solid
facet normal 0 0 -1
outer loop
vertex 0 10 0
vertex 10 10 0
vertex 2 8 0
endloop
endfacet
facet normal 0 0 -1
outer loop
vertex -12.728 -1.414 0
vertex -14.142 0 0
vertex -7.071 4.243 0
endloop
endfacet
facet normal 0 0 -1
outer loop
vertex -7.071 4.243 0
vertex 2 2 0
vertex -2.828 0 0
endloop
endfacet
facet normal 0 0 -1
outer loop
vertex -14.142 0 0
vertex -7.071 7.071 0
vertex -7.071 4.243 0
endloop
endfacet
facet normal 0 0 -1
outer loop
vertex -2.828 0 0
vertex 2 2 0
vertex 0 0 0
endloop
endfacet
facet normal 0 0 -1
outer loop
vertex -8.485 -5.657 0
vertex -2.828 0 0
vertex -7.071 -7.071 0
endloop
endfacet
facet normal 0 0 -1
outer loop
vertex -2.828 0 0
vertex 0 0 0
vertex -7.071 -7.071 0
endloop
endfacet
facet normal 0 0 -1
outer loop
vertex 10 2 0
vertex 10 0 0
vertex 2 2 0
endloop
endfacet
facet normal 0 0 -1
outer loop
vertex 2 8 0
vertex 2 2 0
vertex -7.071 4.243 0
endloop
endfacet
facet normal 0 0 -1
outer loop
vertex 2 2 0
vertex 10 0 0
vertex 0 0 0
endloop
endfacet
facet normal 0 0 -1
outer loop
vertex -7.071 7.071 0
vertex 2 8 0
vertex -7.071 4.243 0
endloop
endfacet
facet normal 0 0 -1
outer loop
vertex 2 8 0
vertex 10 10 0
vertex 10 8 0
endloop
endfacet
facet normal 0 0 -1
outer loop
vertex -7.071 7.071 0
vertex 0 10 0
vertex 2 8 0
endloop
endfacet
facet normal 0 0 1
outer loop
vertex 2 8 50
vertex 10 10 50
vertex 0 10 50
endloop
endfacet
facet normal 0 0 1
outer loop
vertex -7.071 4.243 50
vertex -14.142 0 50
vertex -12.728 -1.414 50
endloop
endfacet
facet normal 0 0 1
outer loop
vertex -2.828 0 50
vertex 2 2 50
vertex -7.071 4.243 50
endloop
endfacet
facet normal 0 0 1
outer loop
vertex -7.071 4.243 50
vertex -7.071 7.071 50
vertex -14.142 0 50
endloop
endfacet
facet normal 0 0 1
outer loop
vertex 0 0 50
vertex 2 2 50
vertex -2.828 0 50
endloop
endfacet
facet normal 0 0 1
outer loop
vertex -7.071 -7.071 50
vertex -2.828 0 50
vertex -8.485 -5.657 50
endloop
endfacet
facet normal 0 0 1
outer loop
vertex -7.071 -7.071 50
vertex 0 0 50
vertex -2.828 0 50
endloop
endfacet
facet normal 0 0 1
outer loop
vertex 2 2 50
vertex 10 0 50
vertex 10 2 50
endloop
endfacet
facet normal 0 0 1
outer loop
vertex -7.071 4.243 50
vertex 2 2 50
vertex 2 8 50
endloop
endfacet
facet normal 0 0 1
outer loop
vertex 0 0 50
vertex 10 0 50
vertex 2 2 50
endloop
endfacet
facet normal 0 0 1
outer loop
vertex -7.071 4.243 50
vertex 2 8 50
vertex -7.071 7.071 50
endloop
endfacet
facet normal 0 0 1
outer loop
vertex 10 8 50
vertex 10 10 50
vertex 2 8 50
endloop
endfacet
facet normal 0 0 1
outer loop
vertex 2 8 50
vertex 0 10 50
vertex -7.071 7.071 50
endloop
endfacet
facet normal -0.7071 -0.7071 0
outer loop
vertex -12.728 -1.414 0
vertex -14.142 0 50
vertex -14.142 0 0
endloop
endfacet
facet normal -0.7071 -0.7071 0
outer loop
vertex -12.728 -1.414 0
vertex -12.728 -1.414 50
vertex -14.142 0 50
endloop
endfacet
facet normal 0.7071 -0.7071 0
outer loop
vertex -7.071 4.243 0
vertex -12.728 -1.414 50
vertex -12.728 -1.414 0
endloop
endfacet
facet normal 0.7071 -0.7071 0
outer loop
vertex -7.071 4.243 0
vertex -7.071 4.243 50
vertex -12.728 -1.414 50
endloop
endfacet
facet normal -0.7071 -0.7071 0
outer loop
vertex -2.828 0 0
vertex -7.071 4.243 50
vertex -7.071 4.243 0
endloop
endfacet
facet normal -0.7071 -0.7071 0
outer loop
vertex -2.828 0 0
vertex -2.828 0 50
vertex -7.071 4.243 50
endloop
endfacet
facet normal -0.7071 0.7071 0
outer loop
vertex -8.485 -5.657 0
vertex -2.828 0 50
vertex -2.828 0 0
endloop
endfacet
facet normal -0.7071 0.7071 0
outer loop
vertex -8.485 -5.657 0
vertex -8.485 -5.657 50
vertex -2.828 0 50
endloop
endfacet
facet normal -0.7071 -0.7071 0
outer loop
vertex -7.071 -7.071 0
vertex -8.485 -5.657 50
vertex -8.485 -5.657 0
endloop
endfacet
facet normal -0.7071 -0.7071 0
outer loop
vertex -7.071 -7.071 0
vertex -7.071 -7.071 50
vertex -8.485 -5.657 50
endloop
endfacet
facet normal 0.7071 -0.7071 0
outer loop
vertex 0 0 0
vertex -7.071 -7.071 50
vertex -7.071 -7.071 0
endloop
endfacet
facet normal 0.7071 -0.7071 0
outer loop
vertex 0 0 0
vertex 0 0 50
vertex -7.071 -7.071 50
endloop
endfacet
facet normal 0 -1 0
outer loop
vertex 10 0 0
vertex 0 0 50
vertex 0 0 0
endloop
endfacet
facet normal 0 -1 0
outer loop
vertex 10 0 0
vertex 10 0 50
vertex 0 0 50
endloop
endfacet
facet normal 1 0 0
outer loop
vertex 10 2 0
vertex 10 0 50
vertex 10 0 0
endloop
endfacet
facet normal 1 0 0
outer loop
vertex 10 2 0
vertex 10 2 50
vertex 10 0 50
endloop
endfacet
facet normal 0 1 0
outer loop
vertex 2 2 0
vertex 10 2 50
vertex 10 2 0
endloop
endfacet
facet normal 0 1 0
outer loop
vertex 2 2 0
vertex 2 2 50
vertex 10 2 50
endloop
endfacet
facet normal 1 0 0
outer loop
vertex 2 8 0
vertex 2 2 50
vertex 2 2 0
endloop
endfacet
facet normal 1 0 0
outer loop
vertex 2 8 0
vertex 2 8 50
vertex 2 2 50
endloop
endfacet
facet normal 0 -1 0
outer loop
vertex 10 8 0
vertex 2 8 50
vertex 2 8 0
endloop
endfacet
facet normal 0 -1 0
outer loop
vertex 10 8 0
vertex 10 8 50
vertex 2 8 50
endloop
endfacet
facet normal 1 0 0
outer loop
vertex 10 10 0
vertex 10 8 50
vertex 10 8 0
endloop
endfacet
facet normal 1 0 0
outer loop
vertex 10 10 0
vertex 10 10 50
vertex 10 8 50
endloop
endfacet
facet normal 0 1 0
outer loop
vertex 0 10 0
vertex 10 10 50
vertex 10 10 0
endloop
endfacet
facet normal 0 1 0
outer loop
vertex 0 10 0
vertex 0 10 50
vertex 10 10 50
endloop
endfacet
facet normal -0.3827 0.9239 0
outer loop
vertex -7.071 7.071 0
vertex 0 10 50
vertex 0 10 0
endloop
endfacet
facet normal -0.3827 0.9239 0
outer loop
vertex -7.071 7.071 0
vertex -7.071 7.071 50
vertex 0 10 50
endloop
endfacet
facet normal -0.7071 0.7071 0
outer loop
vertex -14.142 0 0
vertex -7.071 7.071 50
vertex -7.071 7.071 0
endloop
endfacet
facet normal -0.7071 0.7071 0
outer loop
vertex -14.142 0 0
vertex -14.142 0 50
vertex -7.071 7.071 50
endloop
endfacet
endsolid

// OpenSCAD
l = 10;
h = 10;
t = 2;

module grip () {
    difference() {
        square([h, l]);
        translate([t, t, 0]) 
            square([h - t, l - (t * 2)]);
    }
}

module middle (a) {
    x = -(l*cos(a));
    y = (l*sin(a));
    polygon(points = [
        [0,0],
        [0,l],
        [x,y],
    ]);
}

module holder (w, a) {
    linear_extrude(w) {
        grip();
        mirror([1,1,0])
        rotate(a + 90) {
            grip();
        }
        middle(a + 90);
    }
}

holder(w = 50, a = -45);
